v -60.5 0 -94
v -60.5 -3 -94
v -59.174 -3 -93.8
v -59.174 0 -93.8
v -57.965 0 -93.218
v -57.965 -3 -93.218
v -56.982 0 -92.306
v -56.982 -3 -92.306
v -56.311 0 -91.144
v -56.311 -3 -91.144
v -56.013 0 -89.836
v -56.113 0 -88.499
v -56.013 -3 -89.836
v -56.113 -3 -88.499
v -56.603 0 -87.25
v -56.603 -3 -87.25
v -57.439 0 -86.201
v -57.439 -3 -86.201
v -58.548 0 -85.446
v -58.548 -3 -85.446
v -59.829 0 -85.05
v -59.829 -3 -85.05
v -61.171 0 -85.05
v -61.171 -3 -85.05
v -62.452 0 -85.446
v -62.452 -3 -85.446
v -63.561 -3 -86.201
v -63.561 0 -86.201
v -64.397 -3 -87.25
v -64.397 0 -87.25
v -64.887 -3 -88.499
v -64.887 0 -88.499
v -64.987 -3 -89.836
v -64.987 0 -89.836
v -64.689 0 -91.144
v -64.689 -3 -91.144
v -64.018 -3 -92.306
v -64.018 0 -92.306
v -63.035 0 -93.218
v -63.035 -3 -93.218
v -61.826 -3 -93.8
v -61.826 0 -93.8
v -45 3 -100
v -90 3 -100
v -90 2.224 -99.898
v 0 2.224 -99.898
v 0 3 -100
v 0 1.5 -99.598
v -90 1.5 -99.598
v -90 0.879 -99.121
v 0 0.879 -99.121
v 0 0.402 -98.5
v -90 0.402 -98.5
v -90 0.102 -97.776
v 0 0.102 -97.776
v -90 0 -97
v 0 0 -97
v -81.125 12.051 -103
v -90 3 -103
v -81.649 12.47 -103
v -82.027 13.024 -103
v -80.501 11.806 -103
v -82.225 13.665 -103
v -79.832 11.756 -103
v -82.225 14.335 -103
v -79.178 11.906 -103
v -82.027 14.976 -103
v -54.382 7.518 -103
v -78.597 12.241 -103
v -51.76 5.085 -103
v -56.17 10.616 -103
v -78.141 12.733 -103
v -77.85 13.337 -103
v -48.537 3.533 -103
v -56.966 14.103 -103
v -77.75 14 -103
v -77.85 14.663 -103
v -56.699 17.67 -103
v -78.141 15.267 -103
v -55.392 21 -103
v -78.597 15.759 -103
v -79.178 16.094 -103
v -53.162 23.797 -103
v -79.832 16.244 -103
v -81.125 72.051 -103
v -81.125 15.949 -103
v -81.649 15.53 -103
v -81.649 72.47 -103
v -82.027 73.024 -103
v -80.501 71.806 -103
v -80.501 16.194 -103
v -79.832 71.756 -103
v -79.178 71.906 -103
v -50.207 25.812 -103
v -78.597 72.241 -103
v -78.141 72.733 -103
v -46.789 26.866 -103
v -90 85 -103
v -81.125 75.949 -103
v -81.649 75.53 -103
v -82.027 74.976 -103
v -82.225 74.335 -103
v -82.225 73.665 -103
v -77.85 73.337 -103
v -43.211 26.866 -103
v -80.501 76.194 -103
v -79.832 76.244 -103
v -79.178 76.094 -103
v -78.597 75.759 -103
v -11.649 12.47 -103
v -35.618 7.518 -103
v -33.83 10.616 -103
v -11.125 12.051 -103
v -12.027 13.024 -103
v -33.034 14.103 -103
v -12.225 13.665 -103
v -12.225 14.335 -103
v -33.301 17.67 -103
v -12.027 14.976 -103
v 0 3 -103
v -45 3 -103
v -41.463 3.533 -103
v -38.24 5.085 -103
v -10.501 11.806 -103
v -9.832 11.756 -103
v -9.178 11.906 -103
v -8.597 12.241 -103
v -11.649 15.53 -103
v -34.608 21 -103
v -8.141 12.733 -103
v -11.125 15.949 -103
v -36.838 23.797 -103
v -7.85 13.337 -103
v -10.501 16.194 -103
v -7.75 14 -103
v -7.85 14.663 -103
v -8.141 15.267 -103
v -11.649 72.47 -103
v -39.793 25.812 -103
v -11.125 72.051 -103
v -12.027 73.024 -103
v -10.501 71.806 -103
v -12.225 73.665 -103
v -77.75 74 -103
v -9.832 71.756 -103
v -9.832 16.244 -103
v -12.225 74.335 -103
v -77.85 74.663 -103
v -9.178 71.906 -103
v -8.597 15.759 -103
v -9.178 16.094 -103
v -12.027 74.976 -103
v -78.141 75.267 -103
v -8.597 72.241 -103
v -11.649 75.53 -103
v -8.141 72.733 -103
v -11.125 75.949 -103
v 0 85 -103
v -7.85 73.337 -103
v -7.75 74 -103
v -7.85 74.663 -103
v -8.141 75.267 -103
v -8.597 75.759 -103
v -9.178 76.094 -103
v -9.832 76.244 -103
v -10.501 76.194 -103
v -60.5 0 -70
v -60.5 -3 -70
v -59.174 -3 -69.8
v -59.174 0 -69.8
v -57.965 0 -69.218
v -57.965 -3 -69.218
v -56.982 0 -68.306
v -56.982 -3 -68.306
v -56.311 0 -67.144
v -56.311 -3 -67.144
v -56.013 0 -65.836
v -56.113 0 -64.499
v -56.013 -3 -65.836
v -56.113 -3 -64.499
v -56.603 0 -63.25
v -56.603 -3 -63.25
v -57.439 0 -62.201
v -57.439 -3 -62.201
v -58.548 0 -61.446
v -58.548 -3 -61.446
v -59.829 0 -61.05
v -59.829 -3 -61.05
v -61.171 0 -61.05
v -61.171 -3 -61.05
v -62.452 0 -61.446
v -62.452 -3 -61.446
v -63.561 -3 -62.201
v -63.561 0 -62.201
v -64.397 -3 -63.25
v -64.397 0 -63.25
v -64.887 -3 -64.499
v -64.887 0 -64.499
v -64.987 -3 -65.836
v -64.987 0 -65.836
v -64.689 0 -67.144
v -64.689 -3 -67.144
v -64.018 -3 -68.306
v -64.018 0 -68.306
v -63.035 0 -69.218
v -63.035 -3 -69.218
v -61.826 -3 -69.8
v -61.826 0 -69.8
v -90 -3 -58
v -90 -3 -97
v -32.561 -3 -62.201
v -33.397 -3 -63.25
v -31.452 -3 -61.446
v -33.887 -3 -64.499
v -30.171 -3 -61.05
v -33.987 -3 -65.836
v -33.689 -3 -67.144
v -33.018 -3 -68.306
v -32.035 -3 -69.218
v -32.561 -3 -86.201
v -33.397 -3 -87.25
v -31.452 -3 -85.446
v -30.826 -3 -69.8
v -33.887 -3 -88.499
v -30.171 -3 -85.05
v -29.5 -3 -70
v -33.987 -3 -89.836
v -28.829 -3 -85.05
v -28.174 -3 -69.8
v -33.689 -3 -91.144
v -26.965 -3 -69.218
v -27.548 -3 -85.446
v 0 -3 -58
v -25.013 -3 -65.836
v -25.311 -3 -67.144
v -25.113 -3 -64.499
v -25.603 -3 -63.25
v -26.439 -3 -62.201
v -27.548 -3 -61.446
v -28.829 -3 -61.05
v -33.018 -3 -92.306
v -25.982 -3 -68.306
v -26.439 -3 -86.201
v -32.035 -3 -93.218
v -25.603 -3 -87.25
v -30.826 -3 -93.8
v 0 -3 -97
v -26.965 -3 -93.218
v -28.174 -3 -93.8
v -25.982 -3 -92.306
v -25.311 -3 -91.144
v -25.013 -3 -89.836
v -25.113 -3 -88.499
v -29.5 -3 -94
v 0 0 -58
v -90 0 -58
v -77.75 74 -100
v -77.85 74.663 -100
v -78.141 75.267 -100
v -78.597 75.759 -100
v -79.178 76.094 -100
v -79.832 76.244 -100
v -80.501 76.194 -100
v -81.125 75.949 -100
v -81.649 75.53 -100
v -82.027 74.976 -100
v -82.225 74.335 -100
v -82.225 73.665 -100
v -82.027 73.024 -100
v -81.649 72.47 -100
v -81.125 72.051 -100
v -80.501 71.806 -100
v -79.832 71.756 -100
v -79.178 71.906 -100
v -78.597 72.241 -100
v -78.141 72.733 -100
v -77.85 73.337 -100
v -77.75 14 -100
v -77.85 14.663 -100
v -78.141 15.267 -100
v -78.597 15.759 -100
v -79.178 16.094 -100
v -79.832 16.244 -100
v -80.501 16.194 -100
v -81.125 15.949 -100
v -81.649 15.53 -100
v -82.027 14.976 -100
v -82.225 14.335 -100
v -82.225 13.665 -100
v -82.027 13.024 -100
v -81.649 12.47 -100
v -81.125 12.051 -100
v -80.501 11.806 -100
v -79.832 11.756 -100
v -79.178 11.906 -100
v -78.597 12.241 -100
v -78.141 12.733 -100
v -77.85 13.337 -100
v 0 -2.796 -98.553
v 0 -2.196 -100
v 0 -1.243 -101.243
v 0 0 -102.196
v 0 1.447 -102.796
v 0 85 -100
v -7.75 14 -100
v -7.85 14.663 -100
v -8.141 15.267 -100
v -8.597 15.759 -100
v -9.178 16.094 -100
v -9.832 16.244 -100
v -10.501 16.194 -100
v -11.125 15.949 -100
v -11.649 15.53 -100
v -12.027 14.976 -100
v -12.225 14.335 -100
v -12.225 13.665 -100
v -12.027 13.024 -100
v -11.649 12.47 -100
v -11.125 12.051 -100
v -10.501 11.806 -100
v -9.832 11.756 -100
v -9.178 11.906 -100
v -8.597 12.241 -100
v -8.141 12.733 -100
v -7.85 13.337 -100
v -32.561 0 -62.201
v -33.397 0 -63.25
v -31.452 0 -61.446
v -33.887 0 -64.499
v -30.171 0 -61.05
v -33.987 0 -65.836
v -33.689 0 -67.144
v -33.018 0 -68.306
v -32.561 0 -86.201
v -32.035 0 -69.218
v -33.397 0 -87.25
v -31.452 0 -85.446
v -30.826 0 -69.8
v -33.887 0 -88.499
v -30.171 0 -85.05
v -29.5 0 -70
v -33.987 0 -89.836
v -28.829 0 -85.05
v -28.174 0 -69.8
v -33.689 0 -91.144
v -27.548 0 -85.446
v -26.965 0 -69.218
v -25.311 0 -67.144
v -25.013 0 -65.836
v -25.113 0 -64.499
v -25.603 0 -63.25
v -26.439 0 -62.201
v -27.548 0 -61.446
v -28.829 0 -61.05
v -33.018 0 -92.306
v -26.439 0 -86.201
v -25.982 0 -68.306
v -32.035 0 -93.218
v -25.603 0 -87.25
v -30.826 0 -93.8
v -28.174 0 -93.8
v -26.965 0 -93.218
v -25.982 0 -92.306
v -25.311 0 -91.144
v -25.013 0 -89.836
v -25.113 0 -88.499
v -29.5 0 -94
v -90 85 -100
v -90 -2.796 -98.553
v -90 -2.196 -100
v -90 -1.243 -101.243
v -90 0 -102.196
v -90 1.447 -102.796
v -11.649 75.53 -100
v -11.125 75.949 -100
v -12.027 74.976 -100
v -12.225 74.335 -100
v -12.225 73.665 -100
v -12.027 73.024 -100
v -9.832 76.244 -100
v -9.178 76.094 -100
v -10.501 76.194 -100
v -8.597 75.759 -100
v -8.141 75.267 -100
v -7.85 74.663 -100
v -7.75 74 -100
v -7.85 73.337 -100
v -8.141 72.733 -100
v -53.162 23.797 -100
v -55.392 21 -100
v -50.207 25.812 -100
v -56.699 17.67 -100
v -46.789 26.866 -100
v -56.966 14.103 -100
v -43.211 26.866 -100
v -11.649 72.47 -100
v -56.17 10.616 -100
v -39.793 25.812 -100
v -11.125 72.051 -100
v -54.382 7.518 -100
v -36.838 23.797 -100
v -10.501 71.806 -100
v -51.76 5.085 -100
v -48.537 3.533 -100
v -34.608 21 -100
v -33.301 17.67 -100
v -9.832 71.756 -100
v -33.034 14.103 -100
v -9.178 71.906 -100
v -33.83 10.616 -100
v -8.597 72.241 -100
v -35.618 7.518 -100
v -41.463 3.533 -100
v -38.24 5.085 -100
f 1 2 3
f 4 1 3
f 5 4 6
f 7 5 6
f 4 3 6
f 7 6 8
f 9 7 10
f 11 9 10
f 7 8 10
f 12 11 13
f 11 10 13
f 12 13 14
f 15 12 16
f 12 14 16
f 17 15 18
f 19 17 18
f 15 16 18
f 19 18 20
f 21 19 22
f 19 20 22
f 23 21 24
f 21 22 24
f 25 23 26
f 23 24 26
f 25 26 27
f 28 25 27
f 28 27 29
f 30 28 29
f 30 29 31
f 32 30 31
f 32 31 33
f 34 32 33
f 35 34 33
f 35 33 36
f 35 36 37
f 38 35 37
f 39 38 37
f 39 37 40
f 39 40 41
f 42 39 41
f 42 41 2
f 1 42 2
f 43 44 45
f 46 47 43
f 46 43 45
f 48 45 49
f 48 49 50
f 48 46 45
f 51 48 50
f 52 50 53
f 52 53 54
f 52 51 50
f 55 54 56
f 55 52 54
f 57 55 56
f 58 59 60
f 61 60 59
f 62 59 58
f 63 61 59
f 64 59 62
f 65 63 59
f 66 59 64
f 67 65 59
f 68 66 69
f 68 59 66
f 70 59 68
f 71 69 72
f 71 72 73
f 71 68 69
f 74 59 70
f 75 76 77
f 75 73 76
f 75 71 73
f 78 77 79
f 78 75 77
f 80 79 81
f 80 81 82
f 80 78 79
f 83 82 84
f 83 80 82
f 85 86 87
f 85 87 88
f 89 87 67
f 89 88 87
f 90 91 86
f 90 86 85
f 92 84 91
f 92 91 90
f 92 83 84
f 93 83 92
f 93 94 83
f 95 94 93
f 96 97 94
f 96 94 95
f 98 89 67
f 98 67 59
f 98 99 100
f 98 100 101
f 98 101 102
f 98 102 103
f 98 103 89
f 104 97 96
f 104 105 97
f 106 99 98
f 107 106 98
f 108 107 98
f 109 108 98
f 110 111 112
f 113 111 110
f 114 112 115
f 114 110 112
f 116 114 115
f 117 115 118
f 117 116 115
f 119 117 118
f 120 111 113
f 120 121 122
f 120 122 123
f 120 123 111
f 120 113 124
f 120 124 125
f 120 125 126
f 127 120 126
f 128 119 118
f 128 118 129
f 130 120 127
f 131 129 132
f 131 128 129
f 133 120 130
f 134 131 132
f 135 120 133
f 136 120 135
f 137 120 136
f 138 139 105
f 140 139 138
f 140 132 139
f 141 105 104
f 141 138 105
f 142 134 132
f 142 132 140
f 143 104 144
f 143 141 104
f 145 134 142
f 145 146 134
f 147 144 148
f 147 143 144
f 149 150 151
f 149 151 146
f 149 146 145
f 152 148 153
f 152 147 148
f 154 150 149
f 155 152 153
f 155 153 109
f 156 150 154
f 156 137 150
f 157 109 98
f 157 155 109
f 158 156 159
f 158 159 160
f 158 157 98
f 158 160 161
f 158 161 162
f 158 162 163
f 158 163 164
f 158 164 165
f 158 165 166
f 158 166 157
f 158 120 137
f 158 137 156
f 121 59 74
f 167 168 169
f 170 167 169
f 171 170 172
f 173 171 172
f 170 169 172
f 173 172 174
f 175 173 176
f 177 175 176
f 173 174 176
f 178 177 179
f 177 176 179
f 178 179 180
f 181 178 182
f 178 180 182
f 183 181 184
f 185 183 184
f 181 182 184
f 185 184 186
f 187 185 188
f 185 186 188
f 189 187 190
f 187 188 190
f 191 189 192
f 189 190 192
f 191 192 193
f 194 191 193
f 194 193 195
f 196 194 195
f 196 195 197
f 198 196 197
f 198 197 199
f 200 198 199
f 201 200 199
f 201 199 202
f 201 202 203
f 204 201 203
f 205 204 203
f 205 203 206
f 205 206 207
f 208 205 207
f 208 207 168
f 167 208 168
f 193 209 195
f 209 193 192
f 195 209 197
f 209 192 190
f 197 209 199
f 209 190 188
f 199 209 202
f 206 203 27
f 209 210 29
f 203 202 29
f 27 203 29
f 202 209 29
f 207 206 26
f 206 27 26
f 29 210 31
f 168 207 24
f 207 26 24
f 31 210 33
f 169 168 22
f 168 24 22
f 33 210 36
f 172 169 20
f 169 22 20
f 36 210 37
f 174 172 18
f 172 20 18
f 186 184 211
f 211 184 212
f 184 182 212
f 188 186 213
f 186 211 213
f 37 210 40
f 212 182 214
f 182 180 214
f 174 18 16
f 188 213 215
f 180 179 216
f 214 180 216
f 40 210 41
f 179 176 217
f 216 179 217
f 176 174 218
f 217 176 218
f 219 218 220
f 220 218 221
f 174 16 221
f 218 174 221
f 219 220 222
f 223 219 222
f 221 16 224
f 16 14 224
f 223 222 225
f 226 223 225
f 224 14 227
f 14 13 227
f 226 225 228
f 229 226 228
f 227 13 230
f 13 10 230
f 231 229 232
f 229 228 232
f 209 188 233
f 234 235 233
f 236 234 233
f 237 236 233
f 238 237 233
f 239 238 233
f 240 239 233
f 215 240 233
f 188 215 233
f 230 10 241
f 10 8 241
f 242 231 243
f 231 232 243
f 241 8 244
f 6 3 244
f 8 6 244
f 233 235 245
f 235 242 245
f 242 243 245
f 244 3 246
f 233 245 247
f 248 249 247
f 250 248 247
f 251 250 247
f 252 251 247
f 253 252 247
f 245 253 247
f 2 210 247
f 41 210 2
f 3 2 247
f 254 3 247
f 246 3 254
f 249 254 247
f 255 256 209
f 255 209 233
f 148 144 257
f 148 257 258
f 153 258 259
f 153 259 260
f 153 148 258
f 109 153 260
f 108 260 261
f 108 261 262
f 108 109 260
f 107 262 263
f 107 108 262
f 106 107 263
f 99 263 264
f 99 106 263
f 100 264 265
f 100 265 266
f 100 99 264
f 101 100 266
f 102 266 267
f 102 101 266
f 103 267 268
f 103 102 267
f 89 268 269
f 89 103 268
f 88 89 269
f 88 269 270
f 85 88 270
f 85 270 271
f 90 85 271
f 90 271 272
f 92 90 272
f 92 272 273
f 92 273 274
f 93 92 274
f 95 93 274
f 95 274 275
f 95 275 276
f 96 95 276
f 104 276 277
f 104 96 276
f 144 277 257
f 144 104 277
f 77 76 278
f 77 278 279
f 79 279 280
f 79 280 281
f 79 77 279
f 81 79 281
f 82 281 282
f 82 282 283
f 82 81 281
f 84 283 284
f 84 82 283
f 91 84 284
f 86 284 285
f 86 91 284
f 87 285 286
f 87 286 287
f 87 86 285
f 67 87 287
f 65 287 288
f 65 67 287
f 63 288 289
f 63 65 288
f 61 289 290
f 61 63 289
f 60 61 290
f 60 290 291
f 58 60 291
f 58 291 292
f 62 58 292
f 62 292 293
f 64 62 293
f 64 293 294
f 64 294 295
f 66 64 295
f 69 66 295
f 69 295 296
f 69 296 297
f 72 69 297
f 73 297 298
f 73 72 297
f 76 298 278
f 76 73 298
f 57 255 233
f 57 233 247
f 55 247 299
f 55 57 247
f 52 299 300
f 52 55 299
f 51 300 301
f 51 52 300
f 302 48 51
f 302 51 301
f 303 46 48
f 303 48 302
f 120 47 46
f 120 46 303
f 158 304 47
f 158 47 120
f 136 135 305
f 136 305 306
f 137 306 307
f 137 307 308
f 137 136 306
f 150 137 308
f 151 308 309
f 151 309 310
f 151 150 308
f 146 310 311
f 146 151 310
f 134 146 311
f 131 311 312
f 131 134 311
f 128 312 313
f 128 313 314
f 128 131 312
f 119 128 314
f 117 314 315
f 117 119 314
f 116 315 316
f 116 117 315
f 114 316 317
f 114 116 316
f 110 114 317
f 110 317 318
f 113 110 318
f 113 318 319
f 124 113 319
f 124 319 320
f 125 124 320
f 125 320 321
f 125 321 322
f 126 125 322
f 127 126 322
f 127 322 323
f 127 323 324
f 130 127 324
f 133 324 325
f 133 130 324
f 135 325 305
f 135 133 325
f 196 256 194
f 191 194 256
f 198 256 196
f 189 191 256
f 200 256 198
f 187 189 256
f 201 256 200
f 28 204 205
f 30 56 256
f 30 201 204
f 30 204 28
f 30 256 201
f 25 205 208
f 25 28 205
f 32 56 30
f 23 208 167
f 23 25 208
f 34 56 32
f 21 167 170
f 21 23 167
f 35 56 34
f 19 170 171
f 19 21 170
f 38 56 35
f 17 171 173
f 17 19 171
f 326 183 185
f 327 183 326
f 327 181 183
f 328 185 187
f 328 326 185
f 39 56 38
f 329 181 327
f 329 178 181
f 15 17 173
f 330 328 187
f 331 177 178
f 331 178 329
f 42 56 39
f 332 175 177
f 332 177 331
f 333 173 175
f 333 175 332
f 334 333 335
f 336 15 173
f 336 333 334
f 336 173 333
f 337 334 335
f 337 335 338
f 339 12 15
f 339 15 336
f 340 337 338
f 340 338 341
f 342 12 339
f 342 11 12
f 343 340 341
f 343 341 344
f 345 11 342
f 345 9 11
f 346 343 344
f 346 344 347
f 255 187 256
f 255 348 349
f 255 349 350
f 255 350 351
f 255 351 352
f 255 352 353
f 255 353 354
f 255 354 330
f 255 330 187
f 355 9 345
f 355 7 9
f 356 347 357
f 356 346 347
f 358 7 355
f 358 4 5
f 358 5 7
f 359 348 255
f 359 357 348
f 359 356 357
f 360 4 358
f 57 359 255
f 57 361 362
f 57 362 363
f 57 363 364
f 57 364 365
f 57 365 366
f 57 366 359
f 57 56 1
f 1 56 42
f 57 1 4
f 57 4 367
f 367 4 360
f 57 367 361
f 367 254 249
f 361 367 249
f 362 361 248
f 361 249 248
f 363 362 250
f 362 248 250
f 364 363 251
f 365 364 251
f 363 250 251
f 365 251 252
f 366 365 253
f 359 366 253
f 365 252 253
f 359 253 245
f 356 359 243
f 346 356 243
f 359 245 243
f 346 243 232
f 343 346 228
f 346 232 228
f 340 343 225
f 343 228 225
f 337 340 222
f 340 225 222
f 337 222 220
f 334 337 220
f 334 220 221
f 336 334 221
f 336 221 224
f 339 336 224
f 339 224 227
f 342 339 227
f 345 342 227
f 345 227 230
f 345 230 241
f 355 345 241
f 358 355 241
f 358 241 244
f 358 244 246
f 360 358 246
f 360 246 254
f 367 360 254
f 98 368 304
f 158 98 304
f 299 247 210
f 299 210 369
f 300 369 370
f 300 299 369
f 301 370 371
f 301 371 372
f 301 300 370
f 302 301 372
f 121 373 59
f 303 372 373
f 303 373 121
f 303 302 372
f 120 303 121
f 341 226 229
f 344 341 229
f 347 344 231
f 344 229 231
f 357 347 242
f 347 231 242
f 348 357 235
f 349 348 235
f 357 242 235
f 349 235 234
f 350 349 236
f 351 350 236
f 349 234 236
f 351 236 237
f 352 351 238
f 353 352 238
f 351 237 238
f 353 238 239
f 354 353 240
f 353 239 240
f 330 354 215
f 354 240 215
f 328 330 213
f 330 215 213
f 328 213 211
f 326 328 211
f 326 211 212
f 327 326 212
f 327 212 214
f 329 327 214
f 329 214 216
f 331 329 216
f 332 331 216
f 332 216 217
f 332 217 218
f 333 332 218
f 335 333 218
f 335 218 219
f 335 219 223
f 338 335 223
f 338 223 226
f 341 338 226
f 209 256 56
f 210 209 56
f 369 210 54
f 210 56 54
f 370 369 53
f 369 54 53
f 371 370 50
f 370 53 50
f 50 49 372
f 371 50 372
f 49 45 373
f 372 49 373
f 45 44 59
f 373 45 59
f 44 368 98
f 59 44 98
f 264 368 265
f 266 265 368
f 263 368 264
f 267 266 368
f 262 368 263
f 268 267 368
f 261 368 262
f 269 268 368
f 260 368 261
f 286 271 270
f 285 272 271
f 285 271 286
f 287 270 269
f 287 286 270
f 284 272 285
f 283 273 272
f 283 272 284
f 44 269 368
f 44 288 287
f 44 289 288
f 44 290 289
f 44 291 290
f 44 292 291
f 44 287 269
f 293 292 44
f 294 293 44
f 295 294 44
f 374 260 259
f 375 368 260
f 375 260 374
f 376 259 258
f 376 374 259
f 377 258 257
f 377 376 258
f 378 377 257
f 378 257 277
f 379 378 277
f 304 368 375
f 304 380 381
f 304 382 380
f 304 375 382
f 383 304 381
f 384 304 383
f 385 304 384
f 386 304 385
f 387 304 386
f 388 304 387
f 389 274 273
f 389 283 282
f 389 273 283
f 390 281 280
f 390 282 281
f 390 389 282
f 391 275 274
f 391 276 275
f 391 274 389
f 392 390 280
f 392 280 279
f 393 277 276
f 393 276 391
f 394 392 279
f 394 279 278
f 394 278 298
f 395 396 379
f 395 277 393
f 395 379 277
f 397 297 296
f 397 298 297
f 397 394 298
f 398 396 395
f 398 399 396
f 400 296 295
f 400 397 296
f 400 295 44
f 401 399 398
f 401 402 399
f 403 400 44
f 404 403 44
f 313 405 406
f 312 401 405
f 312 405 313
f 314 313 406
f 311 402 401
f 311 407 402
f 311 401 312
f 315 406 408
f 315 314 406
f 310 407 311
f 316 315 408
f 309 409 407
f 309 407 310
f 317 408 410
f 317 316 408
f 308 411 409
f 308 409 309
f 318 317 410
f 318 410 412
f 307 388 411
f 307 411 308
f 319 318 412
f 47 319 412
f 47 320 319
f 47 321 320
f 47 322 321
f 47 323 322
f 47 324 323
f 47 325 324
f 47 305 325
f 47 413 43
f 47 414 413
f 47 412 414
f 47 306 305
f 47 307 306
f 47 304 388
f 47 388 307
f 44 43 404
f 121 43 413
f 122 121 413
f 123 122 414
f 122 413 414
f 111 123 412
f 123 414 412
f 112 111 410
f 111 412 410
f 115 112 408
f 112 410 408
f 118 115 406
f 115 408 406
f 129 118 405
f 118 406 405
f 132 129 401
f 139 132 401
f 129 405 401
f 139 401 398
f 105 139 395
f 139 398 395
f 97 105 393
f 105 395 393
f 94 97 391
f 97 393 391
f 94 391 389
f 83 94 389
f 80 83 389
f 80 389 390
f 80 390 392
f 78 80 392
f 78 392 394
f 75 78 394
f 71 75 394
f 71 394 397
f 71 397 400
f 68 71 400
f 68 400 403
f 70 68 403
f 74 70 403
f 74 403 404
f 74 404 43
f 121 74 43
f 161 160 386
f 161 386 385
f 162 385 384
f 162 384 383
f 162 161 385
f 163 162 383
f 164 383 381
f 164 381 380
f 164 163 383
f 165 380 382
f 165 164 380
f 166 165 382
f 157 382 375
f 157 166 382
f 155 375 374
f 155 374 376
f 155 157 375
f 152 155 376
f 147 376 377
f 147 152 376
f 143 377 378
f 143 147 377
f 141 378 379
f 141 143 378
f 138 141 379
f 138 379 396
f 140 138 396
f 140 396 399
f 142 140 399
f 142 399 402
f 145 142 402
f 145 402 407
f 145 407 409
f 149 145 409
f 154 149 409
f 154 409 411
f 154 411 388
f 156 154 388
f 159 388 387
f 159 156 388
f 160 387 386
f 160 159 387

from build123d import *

# Parameters (mm, degrees)
SCHIZZO1_W                     = 90
SCHIZZO1_H                     = 100
BASE_FLANGIA1_DEPTH            = 3
BORDO_FLANGIA1_STRIP_W         = 18
BORDO_FLANGIA1_STRIP_H         = 3
BORDO_FLANGIA1_STRIP_CUT_DEPTH = 90
BORDO_FLANGIA1_DEPTH           = 90
RACCORDO1_R                    = 10
SCHIZZO10_R                    = 4.5
TAGLIO_ESTRUSIONE1_DEPTH       = 10
SCHIZZO9_R                     = 12
TAGLIO_ESTRUSIONE2_DEPTH       = 10
SCHIZZO11_W                    = 90
SCHIZZO11_H                    = 58
TAGLIO_ESTRUSIONE3_DEPTH       = 10
SCHIZZO12_W                    = 90
SCHIZZO12_H                    = 15
TAGLIO_ESTRUSIONE4_DEPTH       = 10
FORO_START                     = -103
FORO_PER_VITE_M4_1_OUTLINE_R   = 2.25
FORO_PER_VITE_M4_1_DEPTH       = 3


# Read off the part's stored shape, not the designer's step: Foro per Vite M4-1
# Sheet-metal steps are written as plain solids
with BuildPart() as part:
    # Schizzo1 → Base-Flangia1 (new body)
    with BuildSketch(Plane(origin=(0, 0, 0), x_dir=(1, 0, 0), z_dir=(0, 1, 0))):
        with Locations((-45, 50)):
            Rectangle(SCHIZZO1_W, SCHIZZO1_H)
    extrude(amount=-BASE_FLANGIA1_DEPTH)

    # Bordo-Flangia1 strip (across the edge) → Bordo-Flangia1 strip cut (cut)
    with BuildSketch(Plane(origin=(0, 0, -100), x_dir=(0, 0, 1), z_dir=(-1, 0, 0))):
        with Locations((-6, -1.5)):
            Rectangle(BORDO_FLANGIA1_STRIP_W, BORDO_FLANGIA1_STRIP_H)
    extrude(amount=BORDO_FLANGIA1_STRIP_CUT_DEPTH, mode=Mode.SUBTRACT)

    # Bordo-Flangia1 section (across the edge) → Bordo-Flangia1 (add)
    with BuildSketch(Plane(origin=(0, 0, -100), x_dir=(0, 0, 1), z_dir=(-1, 0, 0))):
        with BuildLine():
            Line((-3, 3), (-3, 100))
            Line((-3, 100), (0, 100))
            Line((0, 100), (0, 3))
            ThreePointArc((0, 3), (0.878679656, 0.878679656), (3, 0))
            Line((3, 0), (3, -3))
            ThreePointArc((3, -3), (-1.242640687, -1.242640687), (-3, 3))
        make_face()
    extrude(amount=BORDO_FLANGIA1_DEPTH)

    # Raccordo1
    raccordo1_edges = [part.edges().sort_by_distance(p)[0] for p in [
        (0, 100, -101.5),
        (-90, 100, -101.5),
        (0, -1.5, 0),
        (-90, -1.5, 0),
    ]]
    fillet(raccordo1_edges, radius=RACCORDO1_R)

    # Schizzo10 → Taglio-Estrusione1 (cut)
    with BuildSketch(Plane.XZ.offset(3)):
        with Locations(Location((-60.5, -89.5, 0), (0, 0, 270))):
            Circle(SCHIZZO10_R)
        with Locations(Location((-60.5, -65.5, 0), (0, 0, 270))):
            Circle(SCHIZZO10_R)
        with Locations(Location((-29.5, -65.5, 0), (0, 0, 270))):
            Circle(SCHIZZO10_R)
        with Locations(Location((-29.5, -89.5, 0), (0, 0, 270))):
            Circle(SCHIZZO10_R)
    extrude(amount=-TAGLIO_ESTRUSIONE1_DEPTH, mode=Mode.SUBTRACT)

    # Schizzo9 → Taglio-Estrusione2 (cut)
    with BuildSketch(Plane.XY.offset(-100)):
        with Locations(Location((-45, 15, 0), (0, 0, 270))):
            Circle(SCHIZZO9_R)
    extrude(amount=-TAGLIO_ESTRUSIONE2_DEPTH, mode=Mode.SUBTRACT)

    # Schizzo11 → Taglio-Estrusione3 (cut)
    with BuildSketch(Plane(origin=(0, 0, 0), x_dir=(1, 0, 0), z_dir=(0, 1, 0))):
        with Locations((-45, 29)):
            Rectangle(SCHIZZO11_W, SCHIZZO11_H)
    extrude(amount=-TAGLIO_ESTRUSIONE3_DEPTH, mode=Mode.SUBTRACT)

    # Schizzo12 → Taglio-Estrusione4 (cut)
    with BuildSketch(Plane.XY.offset(-100)):
        with Locations((-45, 92.5)):
            Rectangle(SCHIZZO12_W, SCHIZZO12_H)
    extrude(amount=-TAGLIO_ESTRUSIONE4_DEPTH, mode=Mode.SUBTRACT)

    # Foro per Vite M4-1 outline → Foro per Vite M4-1 (cut)
    with BuildSketch(Plane.XY.offset(FORO_START)):
        with Locations((-10, 74)):
            Circle(FORO_PER_VITE_M4_1_OUTLINE_R)
        with Locations((-80, 14)):
            Circle(FORO_PER_VITE_M4_1_OUTLINE_R)
        with Locations((-10, 14)):
            Circle(FORO_PER_VITE_M4_1_OUTLINE_R)
        with Locations((-80, 74)):
            Circle(FORO_PER_VITE_M4_1_OUTLINE_R)
    extrude(amount=FORO_PER_VITE_M4_1_DEPTH, mode=Mode.SUBTRACT)


solid = part.part
